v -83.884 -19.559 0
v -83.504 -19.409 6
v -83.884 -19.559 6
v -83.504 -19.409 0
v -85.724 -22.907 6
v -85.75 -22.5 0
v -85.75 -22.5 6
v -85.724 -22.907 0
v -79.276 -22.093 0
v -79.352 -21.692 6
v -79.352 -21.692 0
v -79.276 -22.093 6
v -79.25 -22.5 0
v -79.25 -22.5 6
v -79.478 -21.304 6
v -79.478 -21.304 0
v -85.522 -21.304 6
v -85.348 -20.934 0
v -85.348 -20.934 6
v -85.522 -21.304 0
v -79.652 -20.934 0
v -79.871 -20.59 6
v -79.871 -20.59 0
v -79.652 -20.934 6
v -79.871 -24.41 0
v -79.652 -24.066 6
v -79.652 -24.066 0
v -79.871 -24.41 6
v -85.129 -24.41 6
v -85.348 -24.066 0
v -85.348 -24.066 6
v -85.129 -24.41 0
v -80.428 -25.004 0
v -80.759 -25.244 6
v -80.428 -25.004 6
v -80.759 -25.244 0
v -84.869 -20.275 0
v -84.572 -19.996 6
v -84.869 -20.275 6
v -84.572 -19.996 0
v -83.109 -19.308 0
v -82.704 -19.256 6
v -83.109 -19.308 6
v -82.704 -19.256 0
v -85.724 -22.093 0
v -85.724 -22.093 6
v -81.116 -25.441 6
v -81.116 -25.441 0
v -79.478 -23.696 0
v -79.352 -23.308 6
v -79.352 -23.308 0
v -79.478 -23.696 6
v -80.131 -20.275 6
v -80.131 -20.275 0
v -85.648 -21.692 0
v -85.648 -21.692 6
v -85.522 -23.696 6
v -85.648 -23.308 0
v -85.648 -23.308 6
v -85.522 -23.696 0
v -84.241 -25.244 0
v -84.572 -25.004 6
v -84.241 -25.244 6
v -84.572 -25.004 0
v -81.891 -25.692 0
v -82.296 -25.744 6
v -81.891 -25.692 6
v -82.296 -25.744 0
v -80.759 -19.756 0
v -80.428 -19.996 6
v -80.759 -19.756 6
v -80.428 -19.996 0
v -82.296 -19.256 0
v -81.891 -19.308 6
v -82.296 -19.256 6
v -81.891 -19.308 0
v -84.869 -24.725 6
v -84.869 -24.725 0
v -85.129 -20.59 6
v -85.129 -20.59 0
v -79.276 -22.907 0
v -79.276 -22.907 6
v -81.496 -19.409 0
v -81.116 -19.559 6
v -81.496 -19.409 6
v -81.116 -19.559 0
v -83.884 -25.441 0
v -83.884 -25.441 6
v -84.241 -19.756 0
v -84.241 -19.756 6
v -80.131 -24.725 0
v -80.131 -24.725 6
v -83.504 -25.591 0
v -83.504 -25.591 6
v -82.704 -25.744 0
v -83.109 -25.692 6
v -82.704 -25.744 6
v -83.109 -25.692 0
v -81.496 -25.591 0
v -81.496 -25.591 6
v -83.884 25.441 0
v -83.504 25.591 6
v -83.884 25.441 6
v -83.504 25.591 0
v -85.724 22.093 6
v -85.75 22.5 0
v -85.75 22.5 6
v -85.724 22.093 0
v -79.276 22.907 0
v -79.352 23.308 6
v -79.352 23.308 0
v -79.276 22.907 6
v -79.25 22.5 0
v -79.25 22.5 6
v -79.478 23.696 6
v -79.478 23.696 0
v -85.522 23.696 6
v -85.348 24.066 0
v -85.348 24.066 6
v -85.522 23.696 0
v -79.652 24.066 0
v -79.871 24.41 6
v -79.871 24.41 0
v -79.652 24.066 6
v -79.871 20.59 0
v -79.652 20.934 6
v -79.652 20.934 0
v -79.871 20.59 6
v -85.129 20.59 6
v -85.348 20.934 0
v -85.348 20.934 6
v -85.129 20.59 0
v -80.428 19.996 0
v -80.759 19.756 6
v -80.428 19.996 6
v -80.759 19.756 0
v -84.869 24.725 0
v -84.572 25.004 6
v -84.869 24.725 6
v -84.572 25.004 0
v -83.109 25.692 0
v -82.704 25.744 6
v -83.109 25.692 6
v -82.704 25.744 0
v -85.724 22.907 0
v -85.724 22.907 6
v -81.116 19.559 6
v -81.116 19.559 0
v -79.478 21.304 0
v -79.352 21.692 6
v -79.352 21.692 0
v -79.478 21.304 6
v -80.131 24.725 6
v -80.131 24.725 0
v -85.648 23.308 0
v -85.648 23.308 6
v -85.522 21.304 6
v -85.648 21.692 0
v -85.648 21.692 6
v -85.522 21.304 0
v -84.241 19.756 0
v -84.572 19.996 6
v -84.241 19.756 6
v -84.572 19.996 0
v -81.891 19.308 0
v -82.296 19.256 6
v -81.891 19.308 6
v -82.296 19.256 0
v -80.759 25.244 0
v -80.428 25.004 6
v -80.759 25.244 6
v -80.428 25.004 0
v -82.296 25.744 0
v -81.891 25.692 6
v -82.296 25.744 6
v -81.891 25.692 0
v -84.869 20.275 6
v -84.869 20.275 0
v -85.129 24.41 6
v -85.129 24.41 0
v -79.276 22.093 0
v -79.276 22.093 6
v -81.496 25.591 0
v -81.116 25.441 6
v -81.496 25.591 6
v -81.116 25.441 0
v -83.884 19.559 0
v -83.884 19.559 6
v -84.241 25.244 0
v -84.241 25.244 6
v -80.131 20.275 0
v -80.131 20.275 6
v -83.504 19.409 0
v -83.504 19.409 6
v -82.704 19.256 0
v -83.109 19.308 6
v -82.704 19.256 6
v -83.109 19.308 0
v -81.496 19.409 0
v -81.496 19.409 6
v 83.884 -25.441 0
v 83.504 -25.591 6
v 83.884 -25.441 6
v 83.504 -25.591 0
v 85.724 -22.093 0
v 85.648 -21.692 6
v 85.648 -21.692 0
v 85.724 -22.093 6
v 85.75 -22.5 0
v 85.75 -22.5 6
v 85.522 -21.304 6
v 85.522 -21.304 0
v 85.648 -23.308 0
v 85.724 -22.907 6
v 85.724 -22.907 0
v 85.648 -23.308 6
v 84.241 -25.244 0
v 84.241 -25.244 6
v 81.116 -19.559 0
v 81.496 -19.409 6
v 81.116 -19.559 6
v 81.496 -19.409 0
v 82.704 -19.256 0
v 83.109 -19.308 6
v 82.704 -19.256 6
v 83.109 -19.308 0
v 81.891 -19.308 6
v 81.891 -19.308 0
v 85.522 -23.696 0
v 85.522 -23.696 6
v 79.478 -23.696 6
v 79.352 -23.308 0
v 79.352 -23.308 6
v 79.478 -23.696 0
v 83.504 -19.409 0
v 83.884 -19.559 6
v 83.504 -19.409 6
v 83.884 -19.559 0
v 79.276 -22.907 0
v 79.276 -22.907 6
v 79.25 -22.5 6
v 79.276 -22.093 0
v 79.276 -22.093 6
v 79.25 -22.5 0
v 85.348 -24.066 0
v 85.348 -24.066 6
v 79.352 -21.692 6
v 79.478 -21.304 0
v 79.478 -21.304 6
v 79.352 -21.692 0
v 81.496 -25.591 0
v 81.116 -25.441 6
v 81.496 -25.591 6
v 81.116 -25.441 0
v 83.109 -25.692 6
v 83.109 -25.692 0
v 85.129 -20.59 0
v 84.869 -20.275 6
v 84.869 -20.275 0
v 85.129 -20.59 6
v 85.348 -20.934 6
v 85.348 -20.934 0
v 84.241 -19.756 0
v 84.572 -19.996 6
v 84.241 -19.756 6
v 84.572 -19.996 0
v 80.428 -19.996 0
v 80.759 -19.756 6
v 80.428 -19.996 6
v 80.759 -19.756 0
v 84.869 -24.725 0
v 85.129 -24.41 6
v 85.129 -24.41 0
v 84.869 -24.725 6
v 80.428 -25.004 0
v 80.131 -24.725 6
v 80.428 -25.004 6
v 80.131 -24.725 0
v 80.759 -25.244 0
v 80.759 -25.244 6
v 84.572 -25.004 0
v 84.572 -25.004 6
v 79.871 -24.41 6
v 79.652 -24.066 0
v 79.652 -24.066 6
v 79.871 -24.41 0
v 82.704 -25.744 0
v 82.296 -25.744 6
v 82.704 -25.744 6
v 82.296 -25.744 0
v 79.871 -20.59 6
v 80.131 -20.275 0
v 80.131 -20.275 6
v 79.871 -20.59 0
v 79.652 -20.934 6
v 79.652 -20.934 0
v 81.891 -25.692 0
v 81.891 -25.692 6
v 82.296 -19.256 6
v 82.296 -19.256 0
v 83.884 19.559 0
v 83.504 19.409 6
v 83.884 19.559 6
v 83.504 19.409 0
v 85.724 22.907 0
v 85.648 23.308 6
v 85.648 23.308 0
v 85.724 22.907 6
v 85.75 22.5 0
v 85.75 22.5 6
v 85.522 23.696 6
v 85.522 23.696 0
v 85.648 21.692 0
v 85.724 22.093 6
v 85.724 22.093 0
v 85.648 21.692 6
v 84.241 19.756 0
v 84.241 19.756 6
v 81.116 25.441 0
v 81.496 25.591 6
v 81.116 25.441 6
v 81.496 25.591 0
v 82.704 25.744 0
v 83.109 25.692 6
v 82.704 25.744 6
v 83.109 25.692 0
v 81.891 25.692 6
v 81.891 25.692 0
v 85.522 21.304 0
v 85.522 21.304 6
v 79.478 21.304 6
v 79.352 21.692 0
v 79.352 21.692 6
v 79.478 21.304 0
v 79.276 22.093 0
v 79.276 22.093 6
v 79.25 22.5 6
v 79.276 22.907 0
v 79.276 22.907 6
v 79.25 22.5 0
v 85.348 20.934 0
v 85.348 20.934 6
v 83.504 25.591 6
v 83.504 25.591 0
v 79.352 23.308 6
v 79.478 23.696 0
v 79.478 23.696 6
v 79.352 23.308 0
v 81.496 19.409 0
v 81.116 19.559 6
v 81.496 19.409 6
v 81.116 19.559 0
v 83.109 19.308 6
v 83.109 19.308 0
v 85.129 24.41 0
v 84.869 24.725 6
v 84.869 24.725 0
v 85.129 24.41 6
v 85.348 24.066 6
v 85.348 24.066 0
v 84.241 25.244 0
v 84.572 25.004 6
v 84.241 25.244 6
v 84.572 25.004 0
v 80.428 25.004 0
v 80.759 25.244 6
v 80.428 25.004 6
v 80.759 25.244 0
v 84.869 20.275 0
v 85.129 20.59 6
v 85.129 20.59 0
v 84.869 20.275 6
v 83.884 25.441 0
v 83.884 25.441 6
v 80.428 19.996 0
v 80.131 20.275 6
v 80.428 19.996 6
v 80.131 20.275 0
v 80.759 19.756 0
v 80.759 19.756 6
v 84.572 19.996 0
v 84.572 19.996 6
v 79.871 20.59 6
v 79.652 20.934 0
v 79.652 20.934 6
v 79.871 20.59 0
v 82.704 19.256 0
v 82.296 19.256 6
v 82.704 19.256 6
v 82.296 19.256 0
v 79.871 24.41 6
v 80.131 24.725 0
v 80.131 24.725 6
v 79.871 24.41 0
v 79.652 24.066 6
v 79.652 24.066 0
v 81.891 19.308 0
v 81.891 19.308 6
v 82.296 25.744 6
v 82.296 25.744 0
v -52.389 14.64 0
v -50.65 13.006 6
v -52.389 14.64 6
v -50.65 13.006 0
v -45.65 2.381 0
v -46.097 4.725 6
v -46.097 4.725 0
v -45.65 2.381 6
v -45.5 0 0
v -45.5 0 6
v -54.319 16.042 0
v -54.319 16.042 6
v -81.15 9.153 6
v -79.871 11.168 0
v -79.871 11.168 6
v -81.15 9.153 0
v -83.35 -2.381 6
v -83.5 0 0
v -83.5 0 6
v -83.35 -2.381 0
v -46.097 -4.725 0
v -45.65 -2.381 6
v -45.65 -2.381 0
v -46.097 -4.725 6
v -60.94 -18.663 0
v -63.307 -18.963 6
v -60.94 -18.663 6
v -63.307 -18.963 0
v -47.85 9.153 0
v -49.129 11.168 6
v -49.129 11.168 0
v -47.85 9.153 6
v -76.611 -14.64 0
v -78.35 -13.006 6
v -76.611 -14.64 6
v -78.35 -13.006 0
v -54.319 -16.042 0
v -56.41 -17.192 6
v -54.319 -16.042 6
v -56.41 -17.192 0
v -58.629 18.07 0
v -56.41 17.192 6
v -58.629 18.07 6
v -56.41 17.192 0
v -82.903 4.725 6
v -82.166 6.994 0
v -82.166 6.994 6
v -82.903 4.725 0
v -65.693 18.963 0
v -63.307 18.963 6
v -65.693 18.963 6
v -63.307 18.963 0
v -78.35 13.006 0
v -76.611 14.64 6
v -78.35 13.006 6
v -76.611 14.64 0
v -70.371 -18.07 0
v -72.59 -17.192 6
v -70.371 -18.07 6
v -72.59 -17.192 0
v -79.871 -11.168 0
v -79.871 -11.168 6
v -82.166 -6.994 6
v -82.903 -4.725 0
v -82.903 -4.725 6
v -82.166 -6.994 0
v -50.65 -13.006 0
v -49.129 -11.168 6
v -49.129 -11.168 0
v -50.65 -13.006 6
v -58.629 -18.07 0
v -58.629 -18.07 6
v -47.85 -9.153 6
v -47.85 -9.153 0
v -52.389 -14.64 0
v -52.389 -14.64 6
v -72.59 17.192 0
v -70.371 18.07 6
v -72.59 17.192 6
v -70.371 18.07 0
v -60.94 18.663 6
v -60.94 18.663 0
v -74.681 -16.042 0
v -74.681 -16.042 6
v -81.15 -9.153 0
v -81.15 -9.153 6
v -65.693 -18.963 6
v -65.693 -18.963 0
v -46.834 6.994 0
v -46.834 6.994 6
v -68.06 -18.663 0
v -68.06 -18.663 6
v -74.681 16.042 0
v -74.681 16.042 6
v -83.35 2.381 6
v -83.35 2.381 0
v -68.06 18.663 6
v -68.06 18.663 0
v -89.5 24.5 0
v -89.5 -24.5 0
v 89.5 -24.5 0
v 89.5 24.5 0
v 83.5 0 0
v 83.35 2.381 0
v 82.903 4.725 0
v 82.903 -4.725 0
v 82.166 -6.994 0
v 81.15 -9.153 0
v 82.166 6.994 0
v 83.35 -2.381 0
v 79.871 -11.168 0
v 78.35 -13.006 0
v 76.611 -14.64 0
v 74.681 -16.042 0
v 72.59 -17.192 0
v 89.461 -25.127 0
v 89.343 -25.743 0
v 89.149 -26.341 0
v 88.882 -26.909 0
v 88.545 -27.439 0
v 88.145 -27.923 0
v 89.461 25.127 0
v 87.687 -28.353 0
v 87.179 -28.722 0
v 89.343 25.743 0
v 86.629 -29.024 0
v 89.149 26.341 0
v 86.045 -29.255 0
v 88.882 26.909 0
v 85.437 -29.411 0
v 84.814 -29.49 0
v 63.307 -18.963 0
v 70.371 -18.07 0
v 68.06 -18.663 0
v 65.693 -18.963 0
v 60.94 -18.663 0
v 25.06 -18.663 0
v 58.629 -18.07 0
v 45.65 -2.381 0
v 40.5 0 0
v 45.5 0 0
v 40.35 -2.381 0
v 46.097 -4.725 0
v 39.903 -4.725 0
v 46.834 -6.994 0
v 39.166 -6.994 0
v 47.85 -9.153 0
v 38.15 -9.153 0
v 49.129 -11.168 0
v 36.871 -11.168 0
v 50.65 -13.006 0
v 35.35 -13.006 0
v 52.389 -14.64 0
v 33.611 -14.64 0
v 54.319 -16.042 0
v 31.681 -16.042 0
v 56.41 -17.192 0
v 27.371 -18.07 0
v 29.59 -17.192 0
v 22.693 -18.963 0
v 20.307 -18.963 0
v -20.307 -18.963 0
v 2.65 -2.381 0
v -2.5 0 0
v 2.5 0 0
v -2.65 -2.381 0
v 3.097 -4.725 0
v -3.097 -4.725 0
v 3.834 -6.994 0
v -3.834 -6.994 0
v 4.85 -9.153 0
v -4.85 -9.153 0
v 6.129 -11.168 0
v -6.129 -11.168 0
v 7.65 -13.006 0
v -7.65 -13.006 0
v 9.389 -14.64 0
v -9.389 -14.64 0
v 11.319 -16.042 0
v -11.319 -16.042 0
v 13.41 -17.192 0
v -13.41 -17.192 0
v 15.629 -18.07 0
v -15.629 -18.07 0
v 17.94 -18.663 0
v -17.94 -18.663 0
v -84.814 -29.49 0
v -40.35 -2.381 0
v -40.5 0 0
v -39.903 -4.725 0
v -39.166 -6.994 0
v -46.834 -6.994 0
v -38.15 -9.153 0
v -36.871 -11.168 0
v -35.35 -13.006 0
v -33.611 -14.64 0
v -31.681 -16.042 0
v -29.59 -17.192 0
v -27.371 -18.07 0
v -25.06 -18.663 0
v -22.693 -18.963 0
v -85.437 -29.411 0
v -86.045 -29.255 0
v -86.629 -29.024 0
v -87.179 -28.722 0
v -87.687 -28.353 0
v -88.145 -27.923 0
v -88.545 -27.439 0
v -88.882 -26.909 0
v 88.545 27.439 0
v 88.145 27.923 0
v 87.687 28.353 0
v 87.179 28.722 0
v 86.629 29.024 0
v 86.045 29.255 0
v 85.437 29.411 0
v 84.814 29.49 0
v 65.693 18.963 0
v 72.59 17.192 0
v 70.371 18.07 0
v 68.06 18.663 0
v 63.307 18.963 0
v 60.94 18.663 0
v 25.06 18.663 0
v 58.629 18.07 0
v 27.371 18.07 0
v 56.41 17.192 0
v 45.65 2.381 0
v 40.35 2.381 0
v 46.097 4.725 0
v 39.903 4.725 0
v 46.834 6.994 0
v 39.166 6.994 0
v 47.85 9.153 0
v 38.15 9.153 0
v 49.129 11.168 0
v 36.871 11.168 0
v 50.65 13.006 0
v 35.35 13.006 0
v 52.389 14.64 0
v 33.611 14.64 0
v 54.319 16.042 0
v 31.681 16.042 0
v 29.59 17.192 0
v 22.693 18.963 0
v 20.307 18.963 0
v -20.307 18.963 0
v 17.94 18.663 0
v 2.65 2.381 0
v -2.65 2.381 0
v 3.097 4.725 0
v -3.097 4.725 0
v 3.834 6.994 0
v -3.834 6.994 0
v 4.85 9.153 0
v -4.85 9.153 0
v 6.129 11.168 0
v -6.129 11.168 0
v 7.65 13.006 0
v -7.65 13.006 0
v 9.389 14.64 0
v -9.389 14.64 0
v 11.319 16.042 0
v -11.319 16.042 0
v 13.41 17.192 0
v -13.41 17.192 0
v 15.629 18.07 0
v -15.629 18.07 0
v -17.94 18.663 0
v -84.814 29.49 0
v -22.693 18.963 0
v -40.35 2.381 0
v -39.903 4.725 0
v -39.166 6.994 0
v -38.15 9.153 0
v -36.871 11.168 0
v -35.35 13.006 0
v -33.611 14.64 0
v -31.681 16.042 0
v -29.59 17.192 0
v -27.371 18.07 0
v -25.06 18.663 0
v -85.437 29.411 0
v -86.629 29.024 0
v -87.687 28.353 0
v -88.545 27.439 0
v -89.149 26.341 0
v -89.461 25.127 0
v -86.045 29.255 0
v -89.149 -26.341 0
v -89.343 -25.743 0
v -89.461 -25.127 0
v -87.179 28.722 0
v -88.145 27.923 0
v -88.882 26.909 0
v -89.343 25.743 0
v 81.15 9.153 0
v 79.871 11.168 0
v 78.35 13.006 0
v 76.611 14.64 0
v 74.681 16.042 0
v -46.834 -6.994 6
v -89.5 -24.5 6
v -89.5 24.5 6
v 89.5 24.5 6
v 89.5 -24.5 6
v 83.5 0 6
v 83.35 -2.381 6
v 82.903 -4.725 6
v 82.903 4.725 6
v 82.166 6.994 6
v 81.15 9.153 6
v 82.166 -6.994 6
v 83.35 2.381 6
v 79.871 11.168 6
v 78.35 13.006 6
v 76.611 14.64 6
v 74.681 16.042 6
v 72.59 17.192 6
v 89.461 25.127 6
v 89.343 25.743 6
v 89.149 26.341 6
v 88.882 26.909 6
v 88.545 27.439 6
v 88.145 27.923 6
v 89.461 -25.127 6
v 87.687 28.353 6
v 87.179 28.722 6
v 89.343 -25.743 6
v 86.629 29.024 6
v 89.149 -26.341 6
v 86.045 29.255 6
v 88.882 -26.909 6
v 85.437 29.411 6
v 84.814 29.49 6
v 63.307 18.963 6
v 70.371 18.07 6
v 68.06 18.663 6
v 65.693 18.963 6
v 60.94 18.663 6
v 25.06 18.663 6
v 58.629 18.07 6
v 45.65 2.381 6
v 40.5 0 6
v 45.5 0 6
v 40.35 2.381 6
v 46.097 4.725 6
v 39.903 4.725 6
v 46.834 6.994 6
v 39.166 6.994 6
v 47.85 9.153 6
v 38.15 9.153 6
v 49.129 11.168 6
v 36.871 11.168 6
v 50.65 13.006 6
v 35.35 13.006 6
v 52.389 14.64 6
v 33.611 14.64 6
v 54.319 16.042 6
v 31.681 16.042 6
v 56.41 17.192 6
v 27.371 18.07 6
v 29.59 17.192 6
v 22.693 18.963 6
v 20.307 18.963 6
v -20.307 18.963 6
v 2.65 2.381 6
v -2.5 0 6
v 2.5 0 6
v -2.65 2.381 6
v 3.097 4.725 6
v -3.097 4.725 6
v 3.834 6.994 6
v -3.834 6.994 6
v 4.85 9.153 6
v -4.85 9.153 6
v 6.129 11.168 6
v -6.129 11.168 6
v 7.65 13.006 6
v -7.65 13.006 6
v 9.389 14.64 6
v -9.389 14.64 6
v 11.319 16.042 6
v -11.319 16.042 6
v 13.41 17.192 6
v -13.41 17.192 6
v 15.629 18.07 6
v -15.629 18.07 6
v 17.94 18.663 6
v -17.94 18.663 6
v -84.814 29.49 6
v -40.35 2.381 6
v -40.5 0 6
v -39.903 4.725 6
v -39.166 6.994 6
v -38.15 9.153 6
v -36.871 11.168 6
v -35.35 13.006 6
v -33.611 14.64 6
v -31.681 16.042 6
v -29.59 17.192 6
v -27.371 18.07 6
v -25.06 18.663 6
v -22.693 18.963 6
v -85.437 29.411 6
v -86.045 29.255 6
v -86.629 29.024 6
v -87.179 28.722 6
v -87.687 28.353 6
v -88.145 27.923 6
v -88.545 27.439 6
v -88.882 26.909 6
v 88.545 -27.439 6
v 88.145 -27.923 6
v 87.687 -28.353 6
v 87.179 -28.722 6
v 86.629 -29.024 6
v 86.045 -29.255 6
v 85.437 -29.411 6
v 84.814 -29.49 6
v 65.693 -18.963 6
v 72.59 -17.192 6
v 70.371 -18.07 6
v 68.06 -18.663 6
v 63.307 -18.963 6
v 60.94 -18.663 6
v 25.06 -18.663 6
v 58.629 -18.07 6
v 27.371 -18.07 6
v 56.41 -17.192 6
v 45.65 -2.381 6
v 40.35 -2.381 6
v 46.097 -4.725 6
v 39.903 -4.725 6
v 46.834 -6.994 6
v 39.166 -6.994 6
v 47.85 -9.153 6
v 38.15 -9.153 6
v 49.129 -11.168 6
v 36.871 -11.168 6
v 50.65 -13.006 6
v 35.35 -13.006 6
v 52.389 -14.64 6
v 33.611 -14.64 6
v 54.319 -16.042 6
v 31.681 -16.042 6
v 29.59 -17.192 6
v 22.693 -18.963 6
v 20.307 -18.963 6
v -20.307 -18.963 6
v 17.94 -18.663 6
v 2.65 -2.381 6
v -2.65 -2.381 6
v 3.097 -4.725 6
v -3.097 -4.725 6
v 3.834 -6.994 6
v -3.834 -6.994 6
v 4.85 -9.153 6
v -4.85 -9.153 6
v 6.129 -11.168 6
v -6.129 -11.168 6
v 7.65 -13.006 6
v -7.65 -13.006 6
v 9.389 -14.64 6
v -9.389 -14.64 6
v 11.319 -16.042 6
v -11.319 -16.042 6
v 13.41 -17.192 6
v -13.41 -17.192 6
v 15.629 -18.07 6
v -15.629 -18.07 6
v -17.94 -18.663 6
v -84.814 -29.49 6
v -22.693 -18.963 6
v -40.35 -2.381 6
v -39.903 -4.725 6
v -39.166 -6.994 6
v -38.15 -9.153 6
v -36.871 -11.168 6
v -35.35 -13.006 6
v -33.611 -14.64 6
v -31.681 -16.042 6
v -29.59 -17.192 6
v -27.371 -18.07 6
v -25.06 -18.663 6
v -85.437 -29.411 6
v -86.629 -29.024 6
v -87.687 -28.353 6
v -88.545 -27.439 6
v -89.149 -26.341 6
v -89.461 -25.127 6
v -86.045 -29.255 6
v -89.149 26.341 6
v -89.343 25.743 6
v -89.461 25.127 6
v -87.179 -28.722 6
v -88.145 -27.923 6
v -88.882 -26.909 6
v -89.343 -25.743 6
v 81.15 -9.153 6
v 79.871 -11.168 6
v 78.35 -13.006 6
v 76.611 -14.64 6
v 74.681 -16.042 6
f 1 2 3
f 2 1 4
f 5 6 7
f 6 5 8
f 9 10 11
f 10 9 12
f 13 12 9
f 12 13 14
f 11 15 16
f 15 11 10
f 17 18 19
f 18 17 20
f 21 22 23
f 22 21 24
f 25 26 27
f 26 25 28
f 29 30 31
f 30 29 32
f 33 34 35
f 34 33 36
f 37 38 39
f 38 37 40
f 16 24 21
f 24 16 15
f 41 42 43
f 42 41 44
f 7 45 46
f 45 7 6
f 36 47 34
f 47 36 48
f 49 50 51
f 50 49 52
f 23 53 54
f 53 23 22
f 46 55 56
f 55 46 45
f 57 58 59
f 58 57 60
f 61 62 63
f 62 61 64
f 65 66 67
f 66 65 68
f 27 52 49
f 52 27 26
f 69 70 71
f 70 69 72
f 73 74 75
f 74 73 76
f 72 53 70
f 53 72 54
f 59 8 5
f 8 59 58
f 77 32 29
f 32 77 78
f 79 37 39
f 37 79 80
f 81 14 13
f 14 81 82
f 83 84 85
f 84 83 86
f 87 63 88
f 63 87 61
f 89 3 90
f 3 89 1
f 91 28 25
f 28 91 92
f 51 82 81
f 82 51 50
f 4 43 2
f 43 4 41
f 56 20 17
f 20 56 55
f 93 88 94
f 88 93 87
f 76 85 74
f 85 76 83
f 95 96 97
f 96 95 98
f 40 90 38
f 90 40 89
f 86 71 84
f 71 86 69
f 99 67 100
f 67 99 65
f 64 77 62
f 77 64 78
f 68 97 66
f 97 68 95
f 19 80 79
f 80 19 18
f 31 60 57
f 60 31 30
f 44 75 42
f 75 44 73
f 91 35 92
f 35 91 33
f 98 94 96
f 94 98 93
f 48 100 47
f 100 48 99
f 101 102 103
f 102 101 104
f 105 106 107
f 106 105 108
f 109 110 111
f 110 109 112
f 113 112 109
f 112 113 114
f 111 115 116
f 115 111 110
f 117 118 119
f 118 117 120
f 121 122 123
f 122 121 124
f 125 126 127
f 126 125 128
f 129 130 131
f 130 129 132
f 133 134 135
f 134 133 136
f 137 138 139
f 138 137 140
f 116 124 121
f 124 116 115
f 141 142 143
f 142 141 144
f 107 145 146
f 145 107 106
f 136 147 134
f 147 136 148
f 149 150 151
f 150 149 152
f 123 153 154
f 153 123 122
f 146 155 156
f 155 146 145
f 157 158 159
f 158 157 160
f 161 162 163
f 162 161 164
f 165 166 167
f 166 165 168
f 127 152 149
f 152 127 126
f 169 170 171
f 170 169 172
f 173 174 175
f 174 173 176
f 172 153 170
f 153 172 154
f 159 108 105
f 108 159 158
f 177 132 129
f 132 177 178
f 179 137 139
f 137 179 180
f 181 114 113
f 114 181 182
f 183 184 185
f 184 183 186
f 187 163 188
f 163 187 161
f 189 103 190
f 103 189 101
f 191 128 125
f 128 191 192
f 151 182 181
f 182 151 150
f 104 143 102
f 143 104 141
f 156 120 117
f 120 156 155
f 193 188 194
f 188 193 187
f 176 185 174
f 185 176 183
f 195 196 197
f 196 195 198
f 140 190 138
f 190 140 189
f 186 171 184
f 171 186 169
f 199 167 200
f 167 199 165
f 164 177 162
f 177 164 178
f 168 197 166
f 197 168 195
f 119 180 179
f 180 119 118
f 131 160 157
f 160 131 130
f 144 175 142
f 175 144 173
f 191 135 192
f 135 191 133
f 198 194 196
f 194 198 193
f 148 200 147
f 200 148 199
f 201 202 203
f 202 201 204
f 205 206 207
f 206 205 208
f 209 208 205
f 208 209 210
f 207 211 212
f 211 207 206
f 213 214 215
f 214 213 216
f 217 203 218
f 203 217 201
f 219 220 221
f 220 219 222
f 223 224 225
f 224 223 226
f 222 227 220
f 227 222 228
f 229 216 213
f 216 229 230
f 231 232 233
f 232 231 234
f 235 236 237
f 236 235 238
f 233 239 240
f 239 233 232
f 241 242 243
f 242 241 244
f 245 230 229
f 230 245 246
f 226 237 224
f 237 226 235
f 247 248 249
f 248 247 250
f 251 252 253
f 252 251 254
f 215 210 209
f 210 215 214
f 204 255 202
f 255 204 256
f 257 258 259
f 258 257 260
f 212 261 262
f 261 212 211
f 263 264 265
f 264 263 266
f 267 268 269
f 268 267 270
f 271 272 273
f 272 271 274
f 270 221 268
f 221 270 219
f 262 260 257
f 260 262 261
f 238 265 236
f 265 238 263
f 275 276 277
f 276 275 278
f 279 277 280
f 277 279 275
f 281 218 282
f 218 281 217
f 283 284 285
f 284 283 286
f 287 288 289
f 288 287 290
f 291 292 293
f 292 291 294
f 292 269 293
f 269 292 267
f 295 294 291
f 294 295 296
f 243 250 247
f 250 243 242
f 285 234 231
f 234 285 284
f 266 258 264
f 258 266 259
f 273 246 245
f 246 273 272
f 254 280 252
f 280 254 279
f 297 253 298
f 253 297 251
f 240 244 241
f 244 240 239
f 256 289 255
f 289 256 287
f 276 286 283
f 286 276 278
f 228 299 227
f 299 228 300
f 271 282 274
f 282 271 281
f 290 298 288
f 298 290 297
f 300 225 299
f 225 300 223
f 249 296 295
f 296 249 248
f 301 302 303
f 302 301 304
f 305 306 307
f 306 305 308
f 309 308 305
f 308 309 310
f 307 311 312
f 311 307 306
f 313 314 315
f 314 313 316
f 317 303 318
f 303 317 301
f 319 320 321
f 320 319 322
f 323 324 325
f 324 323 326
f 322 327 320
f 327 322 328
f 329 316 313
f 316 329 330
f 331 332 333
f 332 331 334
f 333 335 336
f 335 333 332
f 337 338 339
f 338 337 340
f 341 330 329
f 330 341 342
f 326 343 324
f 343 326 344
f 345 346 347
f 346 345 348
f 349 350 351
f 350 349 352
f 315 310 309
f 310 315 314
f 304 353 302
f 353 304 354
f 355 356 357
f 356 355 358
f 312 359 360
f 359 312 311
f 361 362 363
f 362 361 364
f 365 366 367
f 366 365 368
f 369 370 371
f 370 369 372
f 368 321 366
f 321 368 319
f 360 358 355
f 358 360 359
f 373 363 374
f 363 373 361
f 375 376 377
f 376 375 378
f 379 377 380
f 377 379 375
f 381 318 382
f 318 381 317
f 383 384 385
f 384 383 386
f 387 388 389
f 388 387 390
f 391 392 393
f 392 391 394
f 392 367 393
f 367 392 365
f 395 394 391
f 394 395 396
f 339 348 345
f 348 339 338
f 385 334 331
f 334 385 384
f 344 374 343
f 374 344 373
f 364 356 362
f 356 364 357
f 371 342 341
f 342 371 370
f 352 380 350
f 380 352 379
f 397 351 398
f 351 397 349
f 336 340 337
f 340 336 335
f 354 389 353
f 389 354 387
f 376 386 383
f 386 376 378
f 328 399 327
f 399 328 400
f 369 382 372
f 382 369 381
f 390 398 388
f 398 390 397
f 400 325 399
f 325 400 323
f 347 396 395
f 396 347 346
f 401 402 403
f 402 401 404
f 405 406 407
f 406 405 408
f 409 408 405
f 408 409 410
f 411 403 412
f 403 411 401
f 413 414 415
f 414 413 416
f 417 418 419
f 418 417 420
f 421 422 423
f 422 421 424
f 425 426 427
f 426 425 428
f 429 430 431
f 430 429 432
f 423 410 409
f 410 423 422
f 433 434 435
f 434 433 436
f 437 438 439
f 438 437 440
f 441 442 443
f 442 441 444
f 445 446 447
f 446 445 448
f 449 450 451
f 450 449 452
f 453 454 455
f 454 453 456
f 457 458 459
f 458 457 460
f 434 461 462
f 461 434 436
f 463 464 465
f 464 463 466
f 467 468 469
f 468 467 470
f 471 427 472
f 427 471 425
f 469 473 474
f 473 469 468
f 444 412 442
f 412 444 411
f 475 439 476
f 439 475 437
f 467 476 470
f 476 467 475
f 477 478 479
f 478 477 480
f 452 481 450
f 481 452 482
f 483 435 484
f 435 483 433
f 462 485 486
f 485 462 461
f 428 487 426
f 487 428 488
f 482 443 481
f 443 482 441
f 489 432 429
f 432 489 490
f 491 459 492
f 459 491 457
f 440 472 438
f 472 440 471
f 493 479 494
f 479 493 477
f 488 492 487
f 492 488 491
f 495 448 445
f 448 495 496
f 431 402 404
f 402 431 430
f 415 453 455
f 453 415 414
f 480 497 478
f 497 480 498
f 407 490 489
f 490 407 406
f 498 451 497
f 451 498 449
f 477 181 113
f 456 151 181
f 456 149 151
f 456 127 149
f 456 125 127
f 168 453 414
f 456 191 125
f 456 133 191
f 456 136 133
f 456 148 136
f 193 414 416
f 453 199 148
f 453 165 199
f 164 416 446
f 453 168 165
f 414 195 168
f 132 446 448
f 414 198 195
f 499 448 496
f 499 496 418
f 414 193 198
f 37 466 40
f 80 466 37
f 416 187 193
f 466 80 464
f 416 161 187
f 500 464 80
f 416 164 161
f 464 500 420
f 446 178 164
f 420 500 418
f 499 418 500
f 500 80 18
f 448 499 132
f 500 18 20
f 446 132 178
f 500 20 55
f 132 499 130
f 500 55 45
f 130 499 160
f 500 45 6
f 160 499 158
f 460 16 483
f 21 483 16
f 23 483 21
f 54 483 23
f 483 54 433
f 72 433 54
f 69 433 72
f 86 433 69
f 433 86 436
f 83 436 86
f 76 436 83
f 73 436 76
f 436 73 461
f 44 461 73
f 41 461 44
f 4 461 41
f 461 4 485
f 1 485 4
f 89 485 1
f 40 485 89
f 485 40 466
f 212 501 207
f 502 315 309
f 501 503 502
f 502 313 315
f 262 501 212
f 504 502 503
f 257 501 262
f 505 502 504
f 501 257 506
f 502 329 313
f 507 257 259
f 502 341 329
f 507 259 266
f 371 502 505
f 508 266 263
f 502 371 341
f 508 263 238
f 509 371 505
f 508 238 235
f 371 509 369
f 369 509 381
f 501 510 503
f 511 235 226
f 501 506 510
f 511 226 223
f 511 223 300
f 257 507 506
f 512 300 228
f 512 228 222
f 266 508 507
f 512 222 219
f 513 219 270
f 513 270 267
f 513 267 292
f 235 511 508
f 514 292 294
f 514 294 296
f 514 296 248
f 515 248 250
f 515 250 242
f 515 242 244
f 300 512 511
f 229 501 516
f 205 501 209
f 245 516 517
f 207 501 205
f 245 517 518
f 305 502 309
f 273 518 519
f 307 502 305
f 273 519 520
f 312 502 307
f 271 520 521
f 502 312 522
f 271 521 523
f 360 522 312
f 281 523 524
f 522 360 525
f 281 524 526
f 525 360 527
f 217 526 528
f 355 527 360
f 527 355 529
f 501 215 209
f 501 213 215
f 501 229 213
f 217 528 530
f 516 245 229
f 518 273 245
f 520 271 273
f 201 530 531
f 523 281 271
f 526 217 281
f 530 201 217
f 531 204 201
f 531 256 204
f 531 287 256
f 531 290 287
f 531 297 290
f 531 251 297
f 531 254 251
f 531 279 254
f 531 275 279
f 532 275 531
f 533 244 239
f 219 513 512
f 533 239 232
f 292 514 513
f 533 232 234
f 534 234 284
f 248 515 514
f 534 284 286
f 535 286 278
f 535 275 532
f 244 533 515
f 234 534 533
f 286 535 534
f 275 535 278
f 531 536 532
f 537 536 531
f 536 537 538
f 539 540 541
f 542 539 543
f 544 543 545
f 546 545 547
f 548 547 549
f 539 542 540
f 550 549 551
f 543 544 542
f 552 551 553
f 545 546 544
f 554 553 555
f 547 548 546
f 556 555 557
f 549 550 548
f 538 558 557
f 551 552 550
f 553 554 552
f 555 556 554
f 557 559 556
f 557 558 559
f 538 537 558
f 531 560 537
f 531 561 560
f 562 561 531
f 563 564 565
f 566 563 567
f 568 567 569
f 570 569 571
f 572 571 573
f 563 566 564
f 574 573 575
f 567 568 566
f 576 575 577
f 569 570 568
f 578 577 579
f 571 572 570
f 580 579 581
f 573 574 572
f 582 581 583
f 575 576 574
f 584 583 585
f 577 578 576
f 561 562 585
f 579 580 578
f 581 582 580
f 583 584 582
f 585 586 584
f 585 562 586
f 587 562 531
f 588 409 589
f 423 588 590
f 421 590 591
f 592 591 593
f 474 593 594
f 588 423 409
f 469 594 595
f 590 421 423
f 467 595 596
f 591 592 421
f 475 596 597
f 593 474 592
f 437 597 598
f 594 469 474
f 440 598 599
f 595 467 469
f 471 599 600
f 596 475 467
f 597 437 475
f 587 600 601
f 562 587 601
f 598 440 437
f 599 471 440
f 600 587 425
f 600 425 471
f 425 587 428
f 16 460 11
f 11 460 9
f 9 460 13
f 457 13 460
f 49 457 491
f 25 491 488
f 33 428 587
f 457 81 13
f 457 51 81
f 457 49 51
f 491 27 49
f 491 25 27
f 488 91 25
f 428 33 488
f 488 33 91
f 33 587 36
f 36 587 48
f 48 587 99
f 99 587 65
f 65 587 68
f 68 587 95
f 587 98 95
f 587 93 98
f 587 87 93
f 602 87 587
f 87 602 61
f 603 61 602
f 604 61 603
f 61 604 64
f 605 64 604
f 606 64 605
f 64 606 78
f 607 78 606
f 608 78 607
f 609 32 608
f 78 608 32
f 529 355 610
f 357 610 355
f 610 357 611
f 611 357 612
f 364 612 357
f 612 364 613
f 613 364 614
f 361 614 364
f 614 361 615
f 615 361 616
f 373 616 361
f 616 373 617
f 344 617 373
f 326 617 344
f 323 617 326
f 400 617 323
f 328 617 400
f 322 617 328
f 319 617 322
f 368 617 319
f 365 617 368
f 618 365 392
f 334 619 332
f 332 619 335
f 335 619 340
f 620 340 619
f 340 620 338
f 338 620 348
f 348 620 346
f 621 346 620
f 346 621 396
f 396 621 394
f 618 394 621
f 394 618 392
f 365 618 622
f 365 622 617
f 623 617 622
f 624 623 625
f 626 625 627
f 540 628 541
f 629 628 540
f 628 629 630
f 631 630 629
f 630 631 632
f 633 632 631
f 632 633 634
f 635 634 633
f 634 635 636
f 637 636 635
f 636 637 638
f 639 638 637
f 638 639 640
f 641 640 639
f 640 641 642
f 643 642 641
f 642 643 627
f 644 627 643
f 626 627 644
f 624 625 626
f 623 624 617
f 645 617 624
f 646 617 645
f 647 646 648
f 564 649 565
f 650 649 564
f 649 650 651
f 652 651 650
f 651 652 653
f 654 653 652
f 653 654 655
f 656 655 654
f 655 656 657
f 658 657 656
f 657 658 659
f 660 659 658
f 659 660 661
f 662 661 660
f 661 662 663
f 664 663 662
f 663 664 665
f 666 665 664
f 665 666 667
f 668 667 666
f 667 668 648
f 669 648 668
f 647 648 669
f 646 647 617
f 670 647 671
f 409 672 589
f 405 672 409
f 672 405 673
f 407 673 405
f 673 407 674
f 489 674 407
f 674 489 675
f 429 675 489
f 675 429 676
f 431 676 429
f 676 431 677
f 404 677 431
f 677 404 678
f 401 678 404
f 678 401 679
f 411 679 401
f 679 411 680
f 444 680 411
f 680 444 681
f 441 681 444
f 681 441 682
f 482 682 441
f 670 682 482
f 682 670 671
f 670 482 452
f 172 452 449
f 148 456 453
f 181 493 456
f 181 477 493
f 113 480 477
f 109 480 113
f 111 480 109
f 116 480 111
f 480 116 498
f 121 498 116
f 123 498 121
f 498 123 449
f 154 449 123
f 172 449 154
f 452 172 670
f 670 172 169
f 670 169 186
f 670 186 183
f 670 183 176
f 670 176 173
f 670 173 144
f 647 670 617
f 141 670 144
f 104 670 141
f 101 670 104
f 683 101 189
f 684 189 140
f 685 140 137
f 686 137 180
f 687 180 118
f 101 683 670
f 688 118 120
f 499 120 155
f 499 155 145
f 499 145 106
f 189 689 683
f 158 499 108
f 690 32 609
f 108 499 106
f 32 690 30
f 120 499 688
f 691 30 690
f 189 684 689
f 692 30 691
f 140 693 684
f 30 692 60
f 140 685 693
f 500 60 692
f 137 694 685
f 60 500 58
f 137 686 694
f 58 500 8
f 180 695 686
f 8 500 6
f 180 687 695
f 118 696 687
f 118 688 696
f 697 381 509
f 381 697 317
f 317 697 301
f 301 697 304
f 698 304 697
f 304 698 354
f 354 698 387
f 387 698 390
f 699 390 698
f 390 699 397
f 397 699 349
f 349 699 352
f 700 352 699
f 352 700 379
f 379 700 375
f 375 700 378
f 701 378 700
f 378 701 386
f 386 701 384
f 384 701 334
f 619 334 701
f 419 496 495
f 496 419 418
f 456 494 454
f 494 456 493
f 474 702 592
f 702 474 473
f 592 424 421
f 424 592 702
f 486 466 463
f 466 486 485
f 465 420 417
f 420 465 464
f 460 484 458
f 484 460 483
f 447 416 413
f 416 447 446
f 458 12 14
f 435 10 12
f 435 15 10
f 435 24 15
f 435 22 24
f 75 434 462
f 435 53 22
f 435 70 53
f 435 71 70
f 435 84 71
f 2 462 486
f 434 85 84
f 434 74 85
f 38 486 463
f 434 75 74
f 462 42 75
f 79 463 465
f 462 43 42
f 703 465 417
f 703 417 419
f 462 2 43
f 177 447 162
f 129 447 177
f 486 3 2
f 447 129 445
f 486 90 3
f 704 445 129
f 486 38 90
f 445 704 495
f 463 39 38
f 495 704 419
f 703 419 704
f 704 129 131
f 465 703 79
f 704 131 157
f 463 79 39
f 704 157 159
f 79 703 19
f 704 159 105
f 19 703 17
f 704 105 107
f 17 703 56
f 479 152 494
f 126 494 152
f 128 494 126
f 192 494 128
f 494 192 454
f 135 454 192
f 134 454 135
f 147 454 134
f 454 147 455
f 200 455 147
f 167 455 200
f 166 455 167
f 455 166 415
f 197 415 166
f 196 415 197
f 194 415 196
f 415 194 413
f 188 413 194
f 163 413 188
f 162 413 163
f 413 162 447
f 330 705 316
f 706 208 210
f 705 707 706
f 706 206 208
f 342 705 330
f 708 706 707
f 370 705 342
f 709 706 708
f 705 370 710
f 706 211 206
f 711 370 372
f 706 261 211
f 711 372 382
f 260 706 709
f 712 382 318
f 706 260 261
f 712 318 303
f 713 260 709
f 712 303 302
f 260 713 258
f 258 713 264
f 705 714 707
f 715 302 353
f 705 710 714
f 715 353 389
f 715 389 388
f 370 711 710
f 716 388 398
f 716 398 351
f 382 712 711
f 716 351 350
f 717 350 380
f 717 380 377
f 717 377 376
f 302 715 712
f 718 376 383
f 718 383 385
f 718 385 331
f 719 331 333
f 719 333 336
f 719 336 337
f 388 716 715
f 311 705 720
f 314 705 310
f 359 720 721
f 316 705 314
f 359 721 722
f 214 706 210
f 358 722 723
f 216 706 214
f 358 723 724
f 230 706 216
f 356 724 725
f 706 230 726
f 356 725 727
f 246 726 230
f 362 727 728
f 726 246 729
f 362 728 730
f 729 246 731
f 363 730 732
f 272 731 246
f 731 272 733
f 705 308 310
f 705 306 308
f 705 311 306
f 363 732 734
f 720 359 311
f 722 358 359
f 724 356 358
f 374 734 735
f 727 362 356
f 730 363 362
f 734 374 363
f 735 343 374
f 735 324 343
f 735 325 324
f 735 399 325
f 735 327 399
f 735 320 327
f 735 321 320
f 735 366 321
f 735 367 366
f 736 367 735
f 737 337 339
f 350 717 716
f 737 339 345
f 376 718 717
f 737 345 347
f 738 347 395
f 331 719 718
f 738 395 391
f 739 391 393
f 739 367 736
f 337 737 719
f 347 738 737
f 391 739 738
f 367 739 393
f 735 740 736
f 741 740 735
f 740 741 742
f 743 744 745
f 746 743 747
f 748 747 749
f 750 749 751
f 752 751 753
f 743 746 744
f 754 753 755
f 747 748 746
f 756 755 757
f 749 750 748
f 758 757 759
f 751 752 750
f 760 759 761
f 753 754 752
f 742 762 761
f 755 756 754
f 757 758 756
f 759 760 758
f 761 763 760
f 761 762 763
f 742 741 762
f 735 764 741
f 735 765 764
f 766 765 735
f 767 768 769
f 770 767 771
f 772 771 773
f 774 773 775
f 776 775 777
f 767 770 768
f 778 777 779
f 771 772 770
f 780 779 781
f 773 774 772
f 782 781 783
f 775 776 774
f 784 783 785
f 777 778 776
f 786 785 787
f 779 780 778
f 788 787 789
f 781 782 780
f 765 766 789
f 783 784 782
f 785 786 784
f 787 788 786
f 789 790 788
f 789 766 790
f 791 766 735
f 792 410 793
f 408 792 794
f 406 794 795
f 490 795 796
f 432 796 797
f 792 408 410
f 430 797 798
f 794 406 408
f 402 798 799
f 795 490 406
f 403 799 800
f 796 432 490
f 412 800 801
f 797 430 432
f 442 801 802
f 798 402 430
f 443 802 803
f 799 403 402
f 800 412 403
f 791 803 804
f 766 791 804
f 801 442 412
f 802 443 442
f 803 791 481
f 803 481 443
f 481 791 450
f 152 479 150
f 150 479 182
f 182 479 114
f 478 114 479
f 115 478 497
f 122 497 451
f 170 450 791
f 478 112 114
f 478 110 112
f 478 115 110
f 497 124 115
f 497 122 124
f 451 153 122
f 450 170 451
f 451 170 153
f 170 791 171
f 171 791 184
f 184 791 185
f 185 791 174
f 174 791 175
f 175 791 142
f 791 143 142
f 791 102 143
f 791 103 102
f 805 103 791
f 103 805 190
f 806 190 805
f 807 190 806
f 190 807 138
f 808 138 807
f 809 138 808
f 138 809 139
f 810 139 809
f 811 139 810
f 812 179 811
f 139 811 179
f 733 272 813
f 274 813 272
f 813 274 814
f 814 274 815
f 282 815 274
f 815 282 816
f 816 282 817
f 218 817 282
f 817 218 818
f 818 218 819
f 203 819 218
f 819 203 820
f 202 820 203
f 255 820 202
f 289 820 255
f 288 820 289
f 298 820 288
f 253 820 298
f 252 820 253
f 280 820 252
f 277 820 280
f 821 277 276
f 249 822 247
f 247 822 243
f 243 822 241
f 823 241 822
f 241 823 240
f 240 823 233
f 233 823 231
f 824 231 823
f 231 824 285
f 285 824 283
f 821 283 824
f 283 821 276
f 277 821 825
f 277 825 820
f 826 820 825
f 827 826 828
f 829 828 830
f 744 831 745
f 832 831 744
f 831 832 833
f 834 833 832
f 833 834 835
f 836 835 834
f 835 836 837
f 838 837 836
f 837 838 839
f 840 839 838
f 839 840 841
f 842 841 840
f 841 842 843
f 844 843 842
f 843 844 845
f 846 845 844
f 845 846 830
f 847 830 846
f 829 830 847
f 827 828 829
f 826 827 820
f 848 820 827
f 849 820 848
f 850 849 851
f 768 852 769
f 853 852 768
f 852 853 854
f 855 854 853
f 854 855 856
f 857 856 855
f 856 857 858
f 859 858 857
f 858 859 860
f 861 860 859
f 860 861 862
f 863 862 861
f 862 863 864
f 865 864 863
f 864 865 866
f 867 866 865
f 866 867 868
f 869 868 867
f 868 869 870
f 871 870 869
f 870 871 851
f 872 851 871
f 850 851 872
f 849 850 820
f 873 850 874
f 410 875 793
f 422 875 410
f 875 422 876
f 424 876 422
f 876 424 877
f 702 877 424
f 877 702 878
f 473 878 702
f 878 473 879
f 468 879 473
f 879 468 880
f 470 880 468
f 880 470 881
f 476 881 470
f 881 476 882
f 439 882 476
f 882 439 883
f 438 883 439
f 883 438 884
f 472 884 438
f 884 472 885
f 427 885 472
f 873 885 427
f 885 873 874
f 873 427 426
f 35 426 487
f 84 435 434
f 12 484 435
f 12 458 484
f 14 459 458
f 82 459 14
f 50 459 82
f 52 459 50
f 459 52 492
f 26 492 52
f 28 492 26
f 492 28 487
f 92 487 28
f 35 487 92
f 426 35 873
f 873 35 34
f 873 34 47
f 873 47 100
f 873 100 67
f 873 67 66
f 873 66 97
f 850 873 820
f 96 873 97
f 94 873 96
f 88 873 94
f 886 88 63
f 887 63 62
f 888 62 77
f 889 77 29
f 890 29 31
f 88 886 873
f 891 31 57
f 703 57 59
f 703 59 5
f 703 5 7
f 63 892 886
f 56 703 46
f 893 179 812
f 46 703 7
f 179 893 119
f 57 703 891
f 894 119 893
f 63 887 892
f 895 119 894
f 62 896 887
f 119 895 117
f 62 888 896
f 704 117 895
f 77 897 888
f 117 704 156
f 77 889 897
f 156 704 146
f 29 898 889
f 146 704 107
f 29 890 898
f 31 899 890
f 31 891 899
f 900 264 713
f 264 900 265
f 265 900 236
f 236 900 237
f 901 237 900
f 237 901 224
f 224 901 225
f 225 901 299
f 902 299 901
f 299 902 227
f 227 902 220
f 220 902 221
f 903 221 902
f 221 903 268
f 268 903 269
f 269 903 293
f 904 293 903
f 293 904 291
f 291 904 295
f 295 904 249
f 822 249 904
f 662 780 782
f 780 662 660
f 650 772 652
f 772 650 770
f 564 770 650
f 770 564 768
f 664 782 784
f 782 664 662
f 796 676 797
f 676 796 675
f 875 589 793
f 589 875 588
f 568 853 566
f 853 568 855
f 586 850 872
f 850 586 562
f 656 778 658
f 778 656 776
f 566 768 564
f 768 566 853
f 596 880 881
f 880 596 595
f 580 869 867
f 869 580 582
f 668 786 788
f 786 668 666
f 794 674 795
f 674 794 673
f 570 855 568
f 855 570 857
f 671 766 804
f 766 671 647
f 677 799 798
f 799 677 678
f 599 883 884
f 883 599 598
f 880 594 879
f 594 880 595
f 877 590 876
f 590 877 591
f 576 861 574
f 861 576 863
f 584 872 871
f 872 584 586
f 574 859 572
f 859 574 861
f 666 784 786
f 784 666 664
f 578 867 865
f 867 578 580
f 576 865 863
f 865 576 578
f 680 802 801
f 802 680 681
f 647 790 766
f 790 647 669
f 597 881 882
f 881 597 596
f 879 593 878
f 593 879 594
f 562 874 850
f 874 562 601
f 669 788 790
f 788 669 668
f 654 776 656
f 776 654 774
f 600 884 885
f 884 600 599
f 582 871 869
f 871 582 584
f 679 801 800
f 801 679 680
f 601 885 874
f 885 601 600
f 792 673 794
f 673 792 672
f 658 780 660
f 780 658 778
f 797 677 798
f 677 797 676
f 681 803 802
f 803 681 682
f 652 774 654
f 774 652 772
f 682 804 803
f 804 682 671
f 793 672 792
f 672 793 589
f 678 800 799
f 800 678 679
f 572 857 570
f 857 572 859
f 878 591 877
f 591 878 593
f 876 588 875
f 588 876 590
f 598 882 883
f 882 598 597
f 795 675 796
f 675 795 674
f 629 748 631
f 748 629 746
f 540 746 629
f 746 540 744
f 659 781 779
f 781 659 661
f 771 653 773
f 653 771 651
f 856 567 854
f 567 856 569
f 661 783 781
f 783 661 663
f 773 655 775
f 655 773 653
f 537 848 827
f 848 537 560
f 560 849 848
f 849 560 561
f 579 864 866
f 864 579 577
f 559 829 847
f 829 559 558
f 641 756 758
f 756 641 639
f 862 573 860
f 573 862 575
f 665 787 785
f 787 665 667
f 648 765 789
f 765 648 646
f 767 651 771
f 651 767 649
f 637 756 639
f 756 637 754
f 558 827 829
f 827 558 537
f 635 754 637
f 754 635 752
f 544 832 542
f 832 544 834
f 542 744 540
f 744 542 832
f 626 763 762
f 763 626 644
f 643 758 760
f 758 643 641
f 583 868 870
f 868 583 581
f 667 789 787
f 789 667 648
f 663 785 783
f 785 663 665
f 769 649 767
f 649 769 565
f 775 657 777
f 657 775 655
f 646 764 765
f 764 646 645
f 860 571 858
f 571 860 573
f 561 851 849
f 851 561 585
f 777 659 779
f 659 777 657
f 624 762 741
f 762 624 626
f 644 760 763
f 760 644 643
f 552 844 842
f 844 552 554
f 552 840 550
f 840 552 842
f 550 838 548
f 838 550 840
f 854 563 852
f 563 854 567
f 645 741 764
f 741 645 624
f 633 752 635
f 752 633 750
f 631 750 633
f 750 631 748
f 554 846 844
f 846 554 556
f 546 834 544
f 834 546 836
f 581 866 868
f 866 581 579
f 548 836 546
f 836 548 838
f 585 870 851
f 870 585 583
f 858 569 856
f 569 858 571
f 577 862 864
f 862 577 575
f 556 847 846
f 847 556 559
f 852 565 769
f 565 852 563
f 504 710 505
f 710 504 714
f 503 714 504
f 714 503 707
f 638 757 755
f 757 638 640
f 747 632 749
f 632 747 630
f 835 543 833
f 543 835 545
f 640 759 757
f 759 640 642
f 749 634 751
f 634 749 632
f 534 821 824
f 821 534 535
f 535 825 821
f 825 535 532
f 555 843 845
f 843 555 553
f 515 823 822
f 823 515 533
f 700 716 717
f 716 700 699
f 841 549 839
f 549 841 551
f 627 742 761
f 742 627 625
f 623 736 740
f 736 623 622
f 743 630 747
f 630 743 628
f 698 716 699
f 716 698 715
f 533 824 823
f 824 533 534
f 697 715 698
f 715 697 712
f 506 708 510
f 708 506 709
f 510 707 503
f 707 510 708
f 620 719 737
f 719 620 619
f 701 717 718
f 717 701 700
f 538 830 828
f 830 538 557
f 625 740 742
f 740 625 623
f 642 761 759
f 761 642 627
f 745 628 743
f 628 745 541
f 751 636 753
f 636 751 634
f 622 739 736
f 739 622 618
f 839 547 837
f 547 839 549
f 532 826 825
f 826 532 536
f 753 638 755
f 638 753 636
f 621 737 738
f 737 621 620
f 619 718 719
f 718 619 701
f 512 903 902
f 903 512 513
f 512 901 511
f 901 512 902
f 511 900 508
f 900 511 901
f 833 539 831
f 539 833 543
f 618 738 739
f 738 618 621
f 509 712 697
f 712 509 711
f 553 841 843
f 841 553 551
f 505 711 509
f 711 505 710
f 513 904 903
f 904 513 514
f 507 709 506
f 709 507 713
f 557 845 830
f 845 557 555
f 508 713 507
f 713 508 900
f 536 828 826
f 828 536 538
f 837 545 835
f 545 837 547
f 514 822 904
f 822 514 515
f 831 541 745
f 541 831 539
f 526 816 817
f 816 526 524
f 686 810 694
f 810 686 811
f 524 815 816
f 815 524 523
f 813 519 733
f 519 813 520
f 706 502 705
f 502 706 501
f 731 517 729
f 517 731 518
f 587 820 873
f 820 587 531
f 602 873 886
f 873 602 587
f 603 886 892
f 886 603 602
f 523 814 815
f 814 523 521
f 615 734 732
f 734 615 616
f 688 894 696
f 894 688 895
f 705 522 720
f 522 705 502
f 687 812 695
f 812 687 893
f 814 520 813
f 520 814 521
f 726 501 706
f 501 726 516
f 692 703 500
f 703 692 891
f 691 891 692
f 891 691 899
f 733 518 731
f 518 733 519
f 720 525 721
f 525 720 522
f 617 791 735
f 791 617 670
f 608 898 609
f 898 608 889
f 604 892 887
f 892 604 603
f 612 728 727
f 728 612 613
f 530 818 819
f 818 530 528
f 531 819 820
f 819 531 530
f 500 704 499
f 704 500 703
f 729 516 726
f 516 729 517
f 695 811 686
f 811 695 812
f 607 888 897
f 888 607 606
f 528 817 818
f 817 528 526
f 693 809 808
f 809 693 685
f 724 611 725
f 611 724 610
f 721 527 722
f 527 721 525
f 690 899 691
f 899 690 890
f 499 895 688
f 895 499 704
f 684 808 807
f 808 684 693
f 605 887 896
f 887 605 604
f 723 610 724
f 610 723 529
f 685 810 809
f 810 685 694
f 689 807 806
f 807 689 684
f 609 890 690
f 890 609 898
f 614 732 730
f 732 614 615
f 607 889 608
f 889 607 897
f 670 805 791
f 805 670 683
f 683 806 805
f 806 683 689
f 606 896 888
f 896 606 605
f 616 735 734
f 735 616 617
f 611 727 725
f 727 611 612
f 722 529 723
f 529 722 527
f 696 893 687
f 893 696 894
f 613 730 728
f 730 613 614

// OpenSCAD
$fn = 50;


difference() {
	union() {
		hull() {
			translate(v = [-84.5000000000, 24.5000000000, 0]) {
				cylinder(h = 6, r = 5);
			}
			translate(v = [84.5000000000, 24.5000000000, 0]) {
				cylinder(h = 6, r = 5);
			}
			translate(v = [-84.5000000000, -24.5000000000, 0]) {
				cylinder(h = 6, r = 5);
			}
			translate(v = [84.5000000000, -24.5000000000, 0]) {
				cylinder(h = 6, r = 5);
			}
		}
	}
	union() {
		#translate(v = [-82.5000000000, -22.5000000000, -100.0000000000]) {
			cylinder(h = 200, r = 3.2500000000);
		}
		#translate(v = [-82.5000000000, 22.5000000000, -100.0000000000]) {
			cylinder(h = 200, r = 3.2500000000);
		}
		#translate(v = [82.5000000000, -22.5000000000, -100.0000000000]) {
			cylinder(h = 200, r = 3.2500000000);
		}
		#translate(v = [82.5000000000, 22.5000000000, -100.0000000000]) {
			cylinder(h = 200, r = 3.2500000000);
		}
		#translate(v = [-64.5000000000, 0, 0]) {
			cylinder(h = 6, r = 19.0000000000);
		}
		#translate(v = [-21.5000000000, 0, 0]) {
			cylinder(h = 6, r = 19.0000000000);
		}
		#translate(v = [21.5000000000, 0, 0]) {
			cylinder(h = 6, r = 19.0000000000);
		}
		#translate(v = [64.5000000000, 0, 0]) {
			cylinder(h = 6, r = 19.0000000000);
		}
	}
}
